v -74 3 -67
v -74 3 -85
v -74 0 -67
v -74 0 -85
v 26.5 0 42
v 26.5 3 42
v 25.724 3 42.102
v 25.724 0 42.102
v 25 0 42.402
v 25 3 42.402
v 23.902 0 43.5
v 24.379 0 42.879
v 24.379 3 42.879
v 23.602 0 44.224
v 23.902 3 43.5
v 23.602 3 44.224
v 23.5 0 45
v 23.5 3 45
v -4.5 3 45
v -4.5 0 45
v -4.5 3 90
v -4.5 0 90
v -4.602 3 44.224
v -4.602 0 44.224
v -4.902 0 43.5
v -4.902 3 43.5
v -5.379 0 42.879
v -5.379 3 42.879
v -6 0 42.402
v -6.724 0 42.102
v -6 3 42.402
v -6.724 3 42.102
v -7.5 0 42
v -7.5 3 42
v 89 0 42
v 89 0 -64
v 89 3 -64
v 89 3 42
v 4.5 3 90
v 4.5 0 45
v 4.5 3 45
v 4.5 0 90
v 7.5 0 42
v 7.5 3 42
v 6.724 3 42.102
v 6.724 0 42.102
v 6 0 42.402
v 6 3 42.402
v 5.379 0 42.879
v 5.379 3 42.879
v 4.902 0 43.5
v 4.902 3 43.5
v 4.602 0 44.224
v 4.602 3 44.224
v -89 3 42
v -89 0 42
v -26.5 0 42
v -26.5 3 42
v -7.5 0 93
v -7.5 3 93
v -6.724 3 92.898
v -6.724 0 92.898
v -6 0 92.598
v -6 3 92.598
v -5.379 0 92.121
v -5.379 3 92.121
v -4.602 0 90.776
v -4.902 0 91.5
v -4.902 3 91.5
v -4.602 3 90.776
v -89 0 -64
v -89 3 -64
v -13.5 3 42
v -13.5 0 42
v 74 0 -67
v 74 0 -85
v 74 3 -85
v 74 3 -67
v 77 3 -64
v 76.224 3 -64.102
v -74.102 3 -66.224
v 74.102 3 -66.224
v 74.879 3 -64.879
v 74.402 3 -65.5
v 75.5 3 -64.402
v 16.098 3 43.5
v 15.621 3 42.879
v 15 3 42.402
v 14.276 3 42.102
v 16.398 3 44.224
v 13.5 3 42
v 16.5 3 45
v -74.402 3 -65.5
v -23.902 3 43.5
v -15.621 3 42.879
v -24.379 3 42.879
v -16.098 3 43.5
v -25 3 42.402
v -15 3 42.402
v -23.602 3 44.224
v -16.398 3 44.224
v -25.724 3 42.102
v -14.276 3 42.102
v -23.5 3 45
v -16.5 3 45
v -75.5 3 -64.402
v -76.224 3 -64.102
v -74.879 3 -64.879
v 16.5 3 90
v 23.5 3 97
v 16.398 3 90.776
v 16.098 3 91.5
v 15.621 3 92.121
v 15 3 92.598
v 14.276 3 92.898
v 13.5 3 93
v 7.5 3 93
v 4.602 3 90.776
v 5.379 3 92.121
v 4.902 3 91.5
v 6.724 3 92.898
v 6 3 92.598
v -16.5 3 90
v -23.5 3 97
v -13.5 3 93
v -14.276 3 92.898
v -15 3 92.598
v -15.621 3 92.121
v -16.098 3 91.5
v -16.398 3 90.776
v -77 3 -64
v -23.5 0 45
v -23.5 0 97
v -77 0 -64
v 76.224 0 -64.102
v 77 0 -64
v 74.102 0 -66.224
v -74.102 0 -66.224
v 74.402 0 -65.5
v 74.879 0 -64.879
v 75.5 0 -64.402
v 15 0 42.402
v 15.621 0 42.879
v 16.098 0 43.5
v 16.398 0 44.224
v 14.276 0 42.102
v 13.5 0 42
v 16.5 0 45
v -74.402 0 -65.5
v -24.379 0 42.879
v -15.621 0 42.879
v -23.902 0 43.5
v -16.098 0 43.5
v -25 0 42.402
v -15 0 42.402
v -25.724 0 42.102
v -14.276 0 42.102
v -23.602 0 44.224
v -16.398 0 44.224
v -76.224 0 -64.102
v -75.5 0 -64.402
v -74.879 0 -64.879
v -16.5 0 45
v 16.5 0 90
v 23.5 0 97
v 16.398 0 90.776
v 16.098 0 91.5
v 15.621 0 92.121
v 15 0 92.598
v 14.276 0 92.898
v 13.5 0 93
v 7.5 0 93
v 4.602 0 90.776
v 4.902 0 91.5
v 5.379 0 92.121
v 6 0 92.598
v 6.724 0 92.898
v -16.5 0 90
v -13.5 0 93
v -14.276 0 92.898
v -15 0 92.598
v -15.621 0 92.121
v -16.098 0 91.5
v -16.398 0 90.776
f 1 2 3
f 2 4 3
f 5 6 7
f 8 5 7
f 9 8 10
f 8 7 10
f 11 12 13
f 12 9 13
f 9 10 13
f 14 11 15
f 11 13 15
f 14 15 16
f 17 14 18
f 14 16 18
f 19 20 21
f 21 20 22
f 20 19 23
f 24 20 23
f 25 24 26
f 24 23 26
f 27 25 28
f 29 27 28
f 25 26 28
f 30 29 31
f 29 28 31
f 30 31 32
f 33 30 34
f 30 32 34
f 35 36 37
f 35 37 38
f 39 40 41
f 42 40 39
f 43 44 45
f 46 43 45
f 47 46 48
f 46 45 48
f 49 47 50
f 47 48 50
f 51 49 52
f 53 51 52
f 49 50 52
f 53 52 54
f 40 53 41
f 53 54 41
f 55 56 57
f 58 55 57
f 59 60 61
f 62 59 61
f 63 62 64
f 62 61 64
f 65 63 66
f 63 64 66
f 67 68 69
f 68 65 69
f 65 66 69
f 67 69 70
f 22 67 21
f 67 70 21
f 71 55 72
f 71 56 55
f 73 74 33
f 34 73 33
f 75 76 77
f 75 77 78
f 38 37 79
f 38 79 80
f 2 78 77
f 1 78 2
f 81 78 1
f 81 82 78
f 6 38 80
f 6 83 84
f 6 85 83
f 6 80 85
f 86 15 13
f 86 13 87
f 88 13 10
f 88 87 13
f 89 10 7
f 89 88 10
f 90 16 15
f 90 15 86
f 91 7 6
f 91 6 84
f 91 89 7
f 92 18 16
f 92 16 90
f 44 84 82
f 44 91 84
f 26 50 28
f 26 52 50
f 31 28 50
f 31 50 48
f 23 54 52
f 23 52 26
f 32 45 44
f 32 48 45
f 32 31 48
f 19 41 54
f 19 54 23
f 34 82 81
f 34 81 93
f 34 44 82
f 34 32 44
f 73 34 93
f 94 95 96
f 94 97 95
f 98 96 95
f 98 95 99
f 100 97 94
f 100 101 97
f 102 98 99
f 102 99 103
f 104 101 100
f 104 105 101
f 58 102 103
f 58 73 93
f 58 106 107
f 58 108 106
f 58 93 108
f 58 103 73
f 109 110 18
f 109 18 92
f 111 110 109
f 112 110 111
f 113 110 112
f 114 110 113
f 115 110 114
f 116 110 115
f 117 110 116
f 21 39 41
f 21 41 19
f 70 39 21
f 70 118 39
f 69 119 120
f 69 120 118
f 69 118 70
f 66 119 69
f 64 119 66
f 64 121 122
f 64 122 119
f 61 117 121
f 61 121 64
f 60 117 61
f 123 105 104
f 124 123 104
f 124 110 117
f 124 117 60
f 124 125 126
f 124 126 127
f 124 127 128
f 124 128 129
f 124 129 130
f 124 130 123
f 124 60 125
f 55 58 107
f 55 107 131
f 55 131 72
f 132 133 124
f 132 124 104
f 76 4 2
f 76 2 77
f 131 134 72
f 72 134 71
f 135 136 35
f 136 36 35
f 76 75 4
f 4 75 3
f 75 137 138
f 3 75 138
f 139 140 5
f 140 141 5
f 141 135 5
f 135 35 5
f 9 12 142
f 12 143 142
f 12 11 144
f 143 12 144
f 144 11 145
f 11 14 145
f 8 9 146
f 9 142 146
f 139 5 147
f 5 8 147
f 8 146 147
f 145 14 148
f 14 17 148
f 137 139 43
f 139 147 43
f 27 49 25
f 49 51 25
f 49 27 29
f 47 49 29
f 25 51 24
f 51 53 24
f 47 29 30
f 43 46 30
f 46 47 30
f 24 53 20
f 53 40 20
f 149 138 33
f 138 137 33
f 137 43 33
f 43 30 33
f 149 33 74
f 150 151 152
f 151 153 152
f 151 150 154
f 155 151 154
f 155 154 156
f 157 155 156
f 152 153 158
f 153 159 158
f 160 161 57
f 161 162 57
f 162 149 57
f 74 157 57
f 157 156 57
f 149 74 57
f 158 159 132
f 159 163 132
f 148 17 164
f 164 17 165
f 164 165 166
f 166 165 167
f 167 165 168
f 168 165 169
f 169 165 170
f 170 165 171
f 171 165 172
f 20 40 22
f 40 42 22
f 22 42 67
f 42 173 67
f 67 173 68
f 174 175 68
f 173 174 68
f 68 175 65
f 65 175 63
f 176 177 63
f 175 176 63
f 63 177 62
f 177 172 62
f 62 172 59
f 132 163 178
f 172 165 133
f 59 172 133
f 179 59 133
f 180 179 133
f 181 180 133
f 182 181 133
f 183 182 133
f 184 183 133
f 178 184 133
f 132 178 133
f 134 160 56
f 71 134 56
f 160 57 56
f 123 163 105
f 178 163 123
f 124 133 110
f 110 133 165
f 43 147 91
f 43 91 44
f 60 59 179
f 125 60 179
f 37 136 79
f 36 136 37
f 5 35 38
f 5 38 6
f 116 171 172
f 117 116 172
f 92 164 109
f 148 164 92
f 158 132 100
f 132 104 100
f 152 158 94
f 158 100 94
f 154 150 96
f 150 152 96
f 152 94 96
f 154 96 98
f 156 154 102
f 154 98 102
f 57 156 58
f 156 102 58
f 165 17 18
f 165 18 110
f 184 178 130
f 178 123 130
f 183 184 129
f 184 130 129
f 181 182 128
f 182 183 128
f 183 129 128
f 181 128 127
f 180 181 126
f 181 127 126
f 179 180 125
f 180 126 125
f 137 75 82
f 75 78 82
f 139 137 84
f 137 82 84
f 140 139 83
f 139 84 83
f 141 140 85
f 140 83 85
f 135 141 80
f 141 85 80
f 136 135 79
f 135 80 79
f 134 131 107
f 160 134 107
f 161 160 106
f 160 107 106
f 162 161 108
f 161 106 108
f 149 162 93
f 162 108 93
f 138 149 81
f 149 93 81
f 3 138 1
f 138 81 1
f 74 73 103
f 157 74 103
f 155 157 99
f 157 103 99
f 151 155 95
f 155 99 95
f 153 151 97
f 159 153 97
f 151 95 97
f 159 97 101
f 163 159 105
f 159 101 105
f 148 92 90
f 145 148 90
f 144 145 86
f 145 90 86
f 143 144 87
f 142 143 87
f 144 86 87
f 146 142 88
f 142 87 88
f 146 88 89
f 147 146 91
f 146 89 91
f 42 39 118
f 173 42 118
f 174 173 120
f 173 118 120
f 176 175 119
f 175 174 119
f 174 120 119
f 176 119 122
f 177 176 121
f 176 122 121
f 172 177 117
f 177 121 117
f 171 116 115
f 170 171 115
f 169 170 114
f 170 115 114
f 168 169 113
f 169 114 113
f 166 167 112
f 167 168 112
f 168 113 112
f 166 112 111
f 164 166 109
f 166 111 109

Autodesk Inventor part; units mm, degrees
ref_plane "YZ Plane" through (0, 0, 0) normal (1, 0, 0) x (0, 1, 0)
ref_plane "XZ Plane" through (0, 0, 0) normal (0, 1, 0) x (-1, 0, 0)
ref_plane "XY Plane" through (0, 0, 0) normal (0, 0, 1) x (1, 0, 0)
sketch "Sketch2" plane through (0, 0, 0) normal (0, 1, 0) x (-1, 0, 0)
  line L0 (-89, 99) -> (89, 99)
  line L1 (89, 99) -> (89, -99)
  line L2 (89, -99) -> (-89, -99)
  line L3 (-89, -99) -> (-89, 99)
  line L4 (-89, 99) -> (89, -99) construction
  line L5 (89, 99) -> (-89, -99) construction
  line L6 (-89, 99) -> (89, 99)
  line L7 (89, 99) -> (89, -85)
  line L8 (89, -85) -> (-89, -85)
  line L9 (-89, -85) -> (-89, 99)
  line L10 (-4.5, 99) -> (-89, 99)
  line L11 (-89, 99) -> (-89, 42)
  line L12 (-89, 42) -> (-4.5, 42)
  line L13 (-4.5, 42) -> (-4.5, 99)
  line L14 (4.5, 99) -> (89, 99)
  line L15 (89, 99) -> (89, 42)
  line L16 (89, 42) -> (4.5, 42)
  line L17 (4.5, 42) -> (4.5, 99)
  line L18 (22.5, 77.5) -> (22.5, 66.5) projected
  line L19 (16.5, 66.5) -> (16.5, 77.5) projected
  line L20 (-22.5, 66.5) -> (-22.5, 77.5) projected
  line L21 (-16.5, 77.5) -> (-16.5, 66.5) projected
  line L22 (-23.5, 99) -> (-16.5, 99)
  line L23 (-16.5, 99) -> (-16.5, 42)
  line L24 (-16.5, 42) -> (-23.5, 42)
  line L25 (-23.5, 42) -> (-23.5, 99)
  line L26 (16.5, 99) -> (23.5, 99)
  line L27 (23.5, 99) -> (23.5, 42)
  line L28 (23.5, 42) -> (16.5, 42)
  line L29 (16.5, 42) -> (16.5, 99)
  line L30 (-89, 99) -> (89, 99)
  line L31 (89, 99) -> (89, 97)
  line L32 (89, 97) -> (-89, 97)
  line L33 (-89, 97) -> (-89, 99)
  line L34 (89, -85) -> (74, -85)
  line L35 (74, -85) -> (74, -64)
  line L36 (74, -64) -> (89, -64)
  line L37 (89, -64) -> (89, -85)
  line L38 (-89, -85) -> (-74, -85)
  line L39 (-74, -85) -> (-74, -64)
  line L40 (-74, -64) -> (-89, -64)
  line L41 (-89, -64) -> (-89, -85)
  line L42 (16.5, 97) -> (-16.5, 97)
  line L43 (-16.5, 97) -> (-16.5, 93)
  line L44 (-16.5, 93) -> (16.5, 93)
  line L45 (16.5, 93) -> (16.5, 97)
  line L46 (-84.4, -75) -> (-84.4, -71.5) projected
  line L47 (-84.4, -71.5) -> (-87, -71.5) projected
  line L48 (-87, -71.5) -> (-87, -75) projected
  line L49 (-87, -75) -> (-84.4, -75) projected
  line L50 (-79.6, -75) -> (-77, -75) projected
  line L51 (-77, -75) -> (-77, -71.5) projected
  line L52 (-77, -71.5) -> (-79.6, -71.5) projected
  line L53 (-79.6, -71.5) -> (-79.6, -75) projected
  line L54 (-75, -78) -> (-89, -78) projected
  line L55 (-89, -78) -> (-89, -63) projected
  line L56 (-89, -63) -> (-75, -63) projected
  line L57 (-75, -63) -> (-75, -78) projected
  circle A0 centre (-80.45, -67.25) radius 1.25 projected
  point P0 (0, 0)
  point P1 (4.5, 99)
  point P2 (-4.5, 99)
  point P3 (-89, 42)
  point P4 (89, 42)
  point P5 (4.5, 97)
  point P6 (-4.5, 97)
  point P7 (-16.5, 97)
  point P8 (-23.5, 97)
  point P9 (23.5, 97)
  point P10 (16.5, 98)
  point P11 (-4.5, 93)
  point P12 (4.5, 93)
  point P13 (16.5, 93)
  dimension "d8" = 178
  dimension "d9" = 198
  dimension "d10" = 14
  dimension "d11" = 84.5
  dimension "d13" = 84.5
  dimension "d17" = 9
  dimension "d18" = 2
  dimension "d19" = 15
  dimension "d20" = 21
  dimension "d21" = 15
  dimension "d22" = 21
  dimension "d75" = 55
  dimension "d76" = 55
  dimension "d77" = 7
  dimension "d78" = 7
  dimension "d79" = 4
extrude "Extrusion2" add sketch "Sketch2" along normal blind 3 contours L32 L23 L21 L12 L25 | L12 L13 L44 L17 L16 L1 L36 L35 L8 L39 L40 L57 L56 L3 | L32 L13 L44 L23 | L56 L57 L40 L3 | L32 L17 L44 L13 | L32 L29 L44 L17 | L32 L27 L16 L29 L19
fillet "Fillet5" radius 3 12 edges at (-16.5, 1.5, 42) (-4.5, 1.5, 42) (-23.5, 1.5, 42) (16.5, 1.5, 42) (-16.5, 1.5, 93) (-4.5, 1.5, 93) (4.5, 1.5, 93) (16.5, 1.5, 93) (4.5, 1.5, 42) (23.5, 1.5, 42) (74, 1.5, -64) (-74, 1.5, -64)
equation "\"d11\" = d13"
properties part number "base" material "Aluminum 6061"
